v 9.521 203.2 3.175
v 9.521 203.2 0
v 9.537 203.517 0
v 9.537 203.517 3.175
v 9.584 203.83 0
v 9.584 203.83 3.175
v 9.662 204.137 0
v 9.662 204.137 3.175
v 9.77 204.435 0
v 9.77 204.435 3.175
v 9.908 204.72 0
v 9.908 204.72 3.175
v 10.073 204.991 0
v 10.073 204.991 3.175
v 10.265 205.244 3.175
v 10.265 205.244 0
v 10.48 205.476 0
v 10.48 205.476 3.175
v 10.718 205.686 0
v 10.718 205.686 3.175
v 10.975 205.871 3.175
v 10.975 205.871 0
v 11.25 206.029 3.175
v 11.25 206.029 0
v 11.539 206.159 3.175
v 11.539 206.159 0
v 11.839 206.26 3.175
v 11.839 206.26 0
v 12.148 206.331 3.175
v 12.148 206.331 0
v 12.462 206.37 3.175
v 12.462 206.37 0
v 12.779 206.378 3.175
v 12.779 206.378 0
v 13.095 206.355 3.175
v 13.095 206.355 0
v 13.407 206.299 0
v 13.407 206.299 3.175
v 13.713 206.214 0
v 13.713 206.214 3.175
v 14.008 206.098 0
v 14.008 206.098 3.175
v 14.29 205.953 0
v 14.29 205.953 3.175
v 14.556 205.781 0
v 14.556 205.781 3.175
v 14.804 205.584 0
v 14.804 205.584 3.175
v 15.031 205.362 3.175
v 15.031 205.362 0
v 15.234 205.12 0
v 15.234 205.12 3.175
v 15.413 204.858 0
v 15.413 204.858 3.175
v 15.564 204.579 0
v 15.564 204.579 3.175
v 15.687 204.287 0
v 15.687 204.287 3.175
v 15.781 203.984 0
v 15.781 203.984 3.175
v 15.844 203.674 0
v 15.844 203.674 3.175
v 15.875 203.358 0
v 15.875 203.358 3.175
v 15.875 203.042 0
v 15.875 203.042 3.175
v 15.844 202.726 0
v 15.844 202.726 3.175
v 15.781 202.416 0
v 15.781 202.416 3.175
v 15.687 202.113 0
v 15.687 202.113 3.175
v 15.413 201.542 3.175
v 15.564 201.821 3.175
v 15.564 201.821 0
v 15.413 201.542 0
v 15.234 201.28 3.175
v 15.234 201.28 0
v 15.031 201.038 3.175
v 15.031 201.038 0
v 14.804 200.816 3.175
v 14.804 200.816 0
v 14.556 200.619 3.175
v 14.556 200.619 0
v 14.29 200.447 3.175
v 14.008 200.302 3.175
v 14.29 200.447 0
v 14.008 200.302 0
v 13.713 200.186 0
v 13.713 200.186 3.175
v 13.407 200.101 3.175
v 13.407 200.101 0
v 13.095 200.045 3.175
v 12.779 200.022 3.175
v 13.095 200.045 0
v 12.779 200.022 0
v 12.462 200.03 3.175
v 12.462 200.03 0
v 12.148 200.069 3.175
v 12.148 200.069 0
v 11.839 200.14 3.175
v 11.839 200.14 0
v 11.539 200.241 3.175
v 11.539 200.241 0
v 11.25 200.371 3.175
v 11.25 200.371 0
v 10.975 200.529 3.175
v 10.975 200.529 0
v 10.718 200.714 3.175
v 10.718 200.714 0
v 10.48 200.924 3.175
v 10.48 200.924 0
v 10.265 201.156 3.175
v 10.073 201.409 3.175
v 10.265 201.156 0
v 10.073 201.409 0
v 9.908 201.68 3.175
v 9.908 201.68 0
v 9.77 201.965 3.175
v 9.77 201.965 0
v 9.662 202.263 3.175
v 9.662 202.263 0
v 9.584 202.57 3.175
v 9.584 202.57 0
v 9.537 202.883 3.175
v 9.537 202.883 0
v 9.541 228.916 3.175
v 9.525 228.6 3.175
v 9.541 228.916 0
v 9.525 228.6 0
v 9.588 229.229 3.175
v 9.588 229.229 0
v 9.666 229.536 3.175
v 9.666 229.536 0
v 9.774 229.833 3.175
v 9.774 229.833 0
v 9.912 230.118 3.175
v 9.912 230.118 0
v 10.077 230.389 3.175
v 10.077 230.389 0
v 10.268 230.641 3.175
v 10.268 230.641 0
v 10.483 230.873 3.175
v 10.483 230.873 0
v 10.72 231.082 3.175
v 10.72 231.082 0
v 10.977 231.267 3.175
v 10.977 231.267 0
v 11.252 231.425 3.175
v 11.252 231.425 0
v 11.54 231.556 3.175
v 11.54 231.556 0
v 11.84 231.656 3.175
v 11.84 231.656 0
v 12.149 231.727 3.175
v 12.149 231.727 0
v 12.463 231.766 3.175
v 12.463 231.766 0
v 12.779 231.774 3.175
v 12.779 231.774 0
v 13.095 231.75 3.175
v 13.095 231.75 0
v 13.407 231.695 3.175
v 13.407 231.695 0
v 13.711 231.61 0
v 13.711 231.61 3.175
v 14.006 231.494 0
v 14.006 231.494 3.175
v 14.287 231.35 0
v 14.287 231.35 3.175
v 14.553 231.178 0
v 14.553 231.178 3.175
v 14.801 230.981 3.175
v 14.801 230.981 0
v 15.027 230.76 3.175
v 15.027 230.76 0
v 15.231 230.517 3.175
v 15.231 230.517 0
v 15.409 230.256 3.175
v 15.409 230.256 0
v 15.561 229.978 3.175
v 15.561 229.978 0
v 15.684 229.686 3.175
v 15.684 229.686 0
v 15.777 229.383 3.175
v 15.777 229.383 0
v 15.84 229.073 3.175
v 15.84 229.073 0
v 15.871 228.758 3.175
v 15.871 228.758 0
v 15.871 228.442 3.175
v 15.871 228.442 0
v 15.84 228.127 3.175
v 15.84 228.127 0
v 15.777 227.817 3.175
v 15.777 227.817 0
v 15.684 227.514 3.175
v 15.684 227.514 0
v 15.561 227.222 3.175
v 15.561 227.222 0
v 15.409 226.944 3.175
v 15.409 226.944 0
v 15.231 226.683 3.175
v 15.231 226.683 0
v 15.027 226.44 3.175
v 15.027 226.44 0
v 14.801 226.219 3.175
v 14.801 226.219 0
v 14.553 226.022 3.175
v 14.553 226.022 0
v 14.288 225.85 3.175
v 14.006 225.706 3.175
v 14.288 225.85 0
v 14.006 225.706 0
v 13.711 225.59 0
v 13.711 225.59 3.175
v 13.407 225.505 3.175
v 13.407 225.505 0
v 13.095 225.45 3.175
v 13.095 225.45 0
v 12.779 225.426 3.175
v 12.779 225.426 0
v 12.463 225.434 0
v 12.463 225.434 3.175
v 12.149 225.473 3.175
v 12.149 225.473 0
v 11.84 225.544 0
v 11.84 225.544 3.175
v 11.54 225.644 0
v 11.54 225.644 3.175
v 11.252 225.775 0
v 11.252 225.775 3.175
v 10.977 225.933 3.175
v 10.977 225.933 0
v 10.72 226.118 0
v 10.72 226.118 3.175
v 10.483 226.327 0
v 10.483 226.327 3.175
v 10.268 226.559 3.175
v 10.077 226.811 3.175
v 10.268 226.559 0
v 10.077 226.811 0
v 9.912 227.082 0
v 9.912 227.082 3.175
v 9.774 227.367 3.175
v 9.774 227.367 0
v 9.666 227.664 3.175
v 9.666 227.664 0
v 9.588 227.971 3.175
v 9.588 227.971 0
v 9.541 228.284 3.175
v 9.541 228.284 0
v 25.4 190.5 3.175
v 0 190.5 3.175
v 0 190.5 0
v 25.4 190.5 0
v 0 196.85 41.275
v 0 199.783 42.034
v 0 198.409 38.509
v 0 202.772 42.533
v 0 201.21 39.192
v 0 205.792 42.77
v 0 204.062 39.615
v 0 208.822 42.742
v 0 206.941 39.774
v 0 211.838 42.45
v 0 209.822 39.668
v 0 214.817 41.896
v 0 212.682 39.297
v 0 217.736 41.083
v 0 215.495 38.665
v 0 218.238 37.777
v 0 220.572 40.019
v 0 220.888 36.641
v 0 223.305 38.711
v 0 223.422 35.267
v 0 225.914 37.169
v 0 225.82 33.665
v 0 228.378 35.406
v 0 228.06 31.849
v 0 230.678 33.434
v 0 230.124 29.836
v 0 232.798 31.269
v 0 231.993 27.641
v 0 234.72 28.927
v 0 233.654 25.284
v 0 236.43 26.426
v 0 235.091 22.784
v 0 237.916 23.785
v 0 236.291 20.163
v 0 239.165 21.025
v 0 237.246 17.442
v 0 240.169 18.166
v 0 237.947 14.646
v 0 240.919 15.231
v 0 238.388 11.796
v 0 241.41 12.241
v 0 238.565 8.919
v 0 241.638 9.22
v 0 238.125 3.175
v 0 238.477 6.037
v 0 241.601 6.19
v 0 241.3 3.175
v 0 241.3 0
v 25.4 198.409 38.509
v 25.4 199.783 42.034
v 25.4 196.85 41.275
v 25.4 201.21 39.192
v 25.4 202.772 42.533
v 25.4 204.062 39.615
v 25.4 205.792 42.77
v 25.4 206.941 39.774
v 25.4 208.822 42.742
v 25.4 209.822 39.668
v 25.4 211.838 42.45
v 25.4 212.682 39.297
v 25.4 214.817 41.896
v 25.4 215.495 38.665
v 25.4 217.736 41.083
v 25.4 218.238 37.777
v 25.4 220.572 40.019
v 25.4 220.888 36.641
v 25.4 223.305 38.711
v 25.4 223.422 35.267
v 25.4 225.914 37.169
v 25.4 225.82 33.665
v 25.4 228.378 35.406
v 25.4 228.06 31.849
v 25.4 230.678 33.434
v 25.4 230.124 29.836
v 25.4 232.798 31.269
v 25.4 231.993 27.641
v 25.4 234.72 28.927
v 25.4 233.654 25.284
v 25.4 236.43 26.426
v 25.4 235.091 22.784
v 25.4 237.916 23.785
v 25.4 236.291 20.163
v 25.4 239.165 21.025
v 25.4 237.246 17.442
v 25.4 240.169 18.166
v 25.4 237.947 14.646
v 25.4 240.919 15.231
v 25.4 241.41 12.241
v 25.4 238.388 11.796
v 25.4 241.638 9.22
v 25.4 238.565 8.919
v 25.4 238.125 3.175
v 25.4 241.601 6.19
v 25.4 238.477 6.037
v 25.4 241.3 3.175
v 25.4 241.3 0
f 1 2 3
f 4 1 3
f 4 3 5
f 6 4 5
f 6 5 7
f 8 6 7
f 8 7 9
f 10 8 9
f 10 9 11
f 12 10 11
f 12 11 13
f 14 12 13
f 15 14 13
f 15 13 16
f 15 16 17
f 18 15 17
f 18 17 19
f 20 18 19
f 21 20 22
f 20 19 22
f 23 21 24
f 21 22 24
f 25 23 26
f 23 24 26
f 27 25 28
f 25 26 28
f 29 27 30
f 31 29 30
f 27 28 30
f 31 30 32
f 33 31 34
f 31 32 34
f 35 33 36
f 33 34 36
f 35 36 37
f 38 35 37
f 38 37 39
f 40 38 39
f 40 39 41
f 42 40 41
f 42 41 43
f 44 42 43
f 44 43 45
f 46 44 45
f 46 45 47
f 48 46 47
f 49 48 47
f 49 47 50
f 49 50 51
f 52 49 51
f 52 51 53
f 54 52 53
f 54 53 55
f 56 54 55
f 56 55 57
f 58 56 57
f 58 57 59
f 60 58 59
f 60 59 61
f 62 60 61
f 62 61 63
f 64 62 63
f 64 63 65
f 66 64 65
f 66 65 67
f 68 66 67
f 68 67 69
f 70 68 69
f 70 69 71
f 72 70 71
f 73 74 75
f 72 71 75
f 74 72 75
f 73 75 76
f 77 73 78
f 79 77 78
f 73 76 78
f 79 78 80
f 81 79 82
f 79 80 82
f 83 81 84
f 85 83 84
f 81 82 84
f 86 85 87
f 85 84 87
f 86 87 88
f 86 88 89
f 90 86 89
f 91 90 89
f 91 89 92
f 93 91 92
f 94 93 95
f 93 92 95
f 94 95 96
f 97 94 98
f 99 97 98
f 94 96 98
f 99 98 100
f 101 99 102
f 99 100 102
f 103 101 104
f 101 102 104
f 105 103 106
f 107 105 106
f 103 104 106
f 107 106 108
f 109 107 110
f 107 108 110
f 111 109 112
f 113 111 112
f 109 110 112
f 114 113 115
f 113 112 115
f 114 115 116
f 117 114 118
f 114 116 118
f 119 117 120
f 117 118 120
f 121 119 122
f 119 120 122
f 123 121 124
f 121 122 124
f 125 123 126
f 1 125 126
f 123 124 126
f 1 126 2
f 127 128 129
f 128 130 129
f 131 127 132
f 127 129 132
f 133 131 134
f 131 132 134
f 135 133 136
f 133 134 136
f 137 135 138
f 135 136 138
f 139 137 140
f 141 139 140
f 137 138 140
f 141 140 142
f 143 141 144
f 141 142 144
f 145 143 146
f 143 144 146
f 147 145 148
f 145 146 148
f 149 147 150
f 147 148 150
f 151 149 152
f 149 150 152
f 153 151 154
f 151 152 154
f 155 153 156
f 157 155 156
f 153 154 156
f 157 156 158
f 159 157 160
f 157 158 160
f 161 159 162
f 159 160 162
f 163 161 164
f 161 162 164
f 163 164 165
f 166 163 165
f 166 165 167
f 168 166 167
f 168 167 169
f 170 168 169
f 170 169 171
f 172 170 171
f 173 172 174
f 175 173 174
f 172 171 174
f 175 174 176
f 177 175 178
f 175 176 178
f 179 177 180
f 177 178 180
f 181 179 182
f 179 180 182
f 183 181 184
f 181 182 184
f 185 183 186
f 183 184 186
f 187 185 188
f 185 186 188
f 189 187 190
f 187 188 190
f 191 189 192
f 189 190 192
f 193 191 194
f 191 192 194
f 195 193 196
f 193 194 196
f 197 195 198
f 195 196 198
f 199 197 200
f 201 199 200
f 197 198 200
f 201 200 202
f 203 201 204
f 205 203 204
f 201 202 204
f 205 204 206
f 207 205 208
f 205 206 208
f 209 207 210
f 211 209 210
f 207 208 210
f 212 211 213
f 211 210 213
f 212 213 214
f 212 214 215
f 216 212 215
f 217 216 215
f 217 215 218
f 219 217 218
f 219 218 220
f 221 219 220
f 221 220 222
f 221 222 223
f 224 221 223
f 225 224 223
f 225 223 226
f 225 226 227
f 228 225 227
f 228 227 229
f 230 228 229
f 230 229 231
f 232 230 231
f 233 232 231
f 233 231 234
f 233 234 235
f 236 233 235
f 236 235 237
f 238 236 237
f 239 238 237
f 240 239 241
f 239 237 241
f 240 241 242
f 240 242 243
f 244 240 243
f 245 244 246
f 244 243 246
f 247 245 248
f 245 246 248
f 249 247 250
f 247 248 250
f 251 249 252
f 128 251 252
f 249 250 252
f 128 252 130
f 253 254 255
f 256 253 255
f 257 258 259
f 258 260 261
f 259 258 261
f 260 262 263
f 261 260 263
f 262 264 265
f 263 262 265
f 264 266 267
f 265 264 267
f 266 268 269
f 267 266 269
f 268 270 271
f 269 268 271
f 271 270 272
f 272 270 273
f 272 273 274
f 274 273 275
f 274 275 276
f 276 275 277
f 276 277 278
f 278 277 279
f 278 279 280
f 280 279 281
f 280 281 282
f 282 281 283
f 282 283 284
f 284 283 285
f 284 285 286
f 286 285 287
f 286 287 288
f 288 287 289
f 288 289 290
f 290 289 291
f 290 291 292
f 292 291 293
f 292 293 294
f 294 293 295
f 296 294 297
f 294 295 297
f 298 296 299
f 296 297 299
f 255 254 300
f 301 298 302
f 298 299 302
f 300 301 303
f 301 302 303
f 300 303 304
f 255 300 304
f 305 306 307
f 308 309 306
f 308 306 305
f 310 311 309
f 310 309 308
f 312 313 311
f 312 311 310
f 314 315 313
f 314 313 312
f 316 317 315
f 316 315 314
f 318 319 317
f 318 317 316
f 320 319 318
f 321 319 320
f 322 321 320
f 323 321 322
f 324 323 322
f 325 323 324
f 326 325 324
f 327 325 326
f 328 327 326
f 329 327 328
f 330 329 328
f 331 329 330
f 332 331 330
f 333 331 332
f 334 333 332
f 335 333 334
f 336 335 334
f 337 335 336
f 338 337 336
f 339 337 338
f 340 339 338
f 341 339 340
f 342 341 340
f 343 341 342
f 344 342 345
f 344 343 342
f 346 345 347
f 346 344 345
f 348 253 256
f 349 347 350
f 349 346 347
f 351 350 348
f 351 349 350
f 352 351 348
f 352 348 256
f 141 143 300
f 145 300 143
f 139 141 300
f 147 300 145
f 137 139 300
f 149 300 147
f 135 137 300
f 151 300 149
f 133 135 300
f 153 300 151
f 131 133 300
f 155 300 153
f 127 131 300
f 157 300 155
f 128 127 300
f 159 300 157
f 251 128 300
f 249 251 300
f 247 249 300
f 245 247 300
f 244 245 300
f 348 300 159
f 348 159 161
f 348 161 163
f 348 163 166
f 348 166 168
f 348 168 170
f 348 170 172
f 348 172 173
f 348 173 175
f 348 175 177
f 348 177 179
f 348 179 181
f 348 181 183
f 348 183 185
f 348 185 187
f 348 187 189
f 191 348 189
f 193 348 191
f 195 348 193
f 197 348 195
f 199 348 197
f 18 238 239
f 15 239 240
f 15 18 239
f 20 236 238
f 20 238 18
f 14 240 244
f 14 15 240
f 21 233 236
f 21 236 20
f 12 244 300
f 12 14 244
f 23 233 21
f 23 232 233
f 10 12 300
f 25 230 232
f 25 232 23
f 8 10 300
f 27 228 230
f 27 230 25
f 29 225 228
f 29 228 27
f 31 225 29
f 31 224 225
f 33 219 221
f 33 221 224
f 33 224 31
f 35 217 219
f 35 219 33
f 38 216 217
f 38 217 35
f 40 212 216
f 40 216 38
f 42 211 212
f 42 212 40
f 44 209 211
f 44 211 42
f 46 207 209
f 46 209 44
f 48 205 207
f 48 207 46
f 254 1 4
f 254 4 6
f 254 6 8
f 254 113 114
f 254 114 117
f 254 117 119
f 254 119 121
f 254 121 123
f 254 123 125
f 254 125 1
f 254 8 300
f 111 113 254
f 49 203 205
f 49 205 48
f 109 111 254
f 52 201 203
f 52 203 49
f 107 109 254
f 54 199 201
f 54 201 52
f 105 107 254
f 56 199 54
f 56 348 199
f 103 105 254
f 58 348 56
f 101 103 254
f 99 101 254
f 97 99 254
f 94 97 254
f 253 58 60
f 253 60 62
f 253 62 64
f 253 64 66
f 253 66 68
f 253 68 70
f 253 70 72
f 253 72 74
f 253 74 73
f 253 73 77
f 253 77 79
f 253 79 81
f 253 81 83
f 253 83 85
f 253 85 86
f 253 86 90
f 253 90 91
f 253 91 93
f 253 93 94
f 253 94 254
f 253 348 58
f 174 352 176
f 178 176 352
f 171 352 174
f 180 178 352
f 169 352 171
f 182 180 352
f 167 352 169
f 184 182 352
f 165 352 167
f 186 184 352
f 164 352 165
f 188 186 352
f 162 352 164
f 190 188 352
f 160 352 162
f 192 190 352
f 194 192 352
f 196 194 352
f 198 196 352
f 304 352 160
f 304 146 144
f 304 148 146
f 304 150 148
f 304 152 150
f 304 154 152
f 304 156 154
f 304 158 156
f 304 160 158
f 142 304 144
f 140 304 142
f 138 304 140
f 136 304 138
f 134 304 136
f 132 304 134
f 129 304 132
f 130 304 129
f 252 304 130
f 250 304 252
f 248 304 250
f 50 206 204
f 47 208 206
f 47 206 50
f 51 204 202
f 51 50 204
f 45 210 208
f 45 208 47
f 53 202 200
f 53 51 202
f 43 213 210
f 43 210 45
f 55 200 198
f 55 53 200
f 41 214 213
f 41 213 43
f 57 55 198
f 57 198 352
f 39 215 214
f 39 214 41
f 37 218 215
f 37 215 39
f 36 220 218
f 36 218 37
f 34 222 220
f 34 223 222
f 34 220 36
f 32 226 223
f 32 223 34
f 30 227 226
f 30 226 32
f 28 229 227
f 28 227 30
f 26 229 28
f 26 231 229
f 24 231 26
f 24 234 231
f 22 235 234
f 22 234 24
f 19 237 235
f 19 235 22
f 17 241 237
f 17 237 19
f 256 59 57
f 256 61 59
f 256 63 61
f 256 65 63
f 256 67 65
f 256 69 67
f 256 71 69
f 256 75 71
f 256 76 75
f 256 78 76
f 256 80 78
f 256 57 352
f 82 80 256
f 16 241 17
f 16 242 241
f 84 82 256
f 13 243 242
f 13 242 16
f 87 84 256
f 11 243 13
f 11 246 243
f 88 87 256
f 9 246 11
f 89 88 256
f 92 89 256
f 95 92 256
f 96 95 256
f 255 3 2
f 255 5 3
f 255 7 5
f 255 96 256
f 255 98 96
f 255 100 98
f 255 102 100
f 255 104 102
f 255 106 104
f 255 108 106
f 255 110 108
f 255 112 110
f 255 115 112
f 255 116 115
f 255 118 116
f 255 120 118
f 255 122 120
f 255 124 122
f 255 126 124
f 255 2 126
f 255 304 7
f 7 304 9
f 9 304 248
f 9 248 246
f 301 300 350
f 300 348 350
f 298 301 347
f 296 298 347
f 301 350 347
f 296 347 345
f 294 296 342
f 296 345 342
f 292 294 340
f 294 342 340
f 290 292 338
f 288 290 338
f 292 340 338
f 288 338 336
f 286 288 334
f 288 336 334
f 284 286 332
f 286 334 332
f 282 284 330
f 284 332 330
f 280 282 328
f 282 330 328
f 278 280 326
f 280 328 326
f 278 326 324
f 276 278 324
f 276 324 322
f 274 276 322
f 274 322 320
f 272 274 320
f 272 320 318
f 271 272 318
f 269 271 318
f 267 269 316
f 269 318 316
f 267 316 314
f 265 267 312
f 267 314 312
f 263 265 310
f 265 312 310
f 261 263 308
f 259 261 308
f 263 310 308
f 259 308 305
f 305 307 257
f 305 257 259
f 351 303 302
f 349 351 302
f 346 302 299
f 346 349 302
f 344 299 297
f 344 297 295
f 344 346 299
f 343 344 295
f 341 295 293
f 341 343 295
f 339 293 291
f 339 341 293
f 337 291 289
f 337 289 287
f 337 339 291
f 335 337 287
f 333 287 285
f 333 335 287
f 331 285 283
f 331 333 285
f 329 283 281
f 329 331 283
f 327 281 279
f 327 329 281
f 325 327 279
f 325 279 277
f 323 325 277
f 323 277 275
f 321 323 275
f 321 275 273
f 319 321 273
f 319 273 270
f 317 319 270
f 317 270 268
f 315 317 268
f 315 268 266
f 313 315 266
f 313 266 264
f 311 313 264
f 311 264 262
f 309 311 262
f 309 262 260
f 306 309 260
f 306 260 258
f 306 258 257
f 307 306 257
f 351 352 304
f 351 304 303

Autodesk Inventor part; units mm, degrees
ref_plane "YZ Plane" through (0, 0, 0) normal (1, 0, 0) x (0, 1, 0)
ref_plane "XZ Plane" through (0, 0, 0) normal (0, 1, 0) x (-1, 0, 0)
ref_plane "XY Plane" through (0, 0, 0) normal (0, 0, 1) x (1, 0, 0)
sketch "Sketch1" plane through (0, 0, 0) normal (1, 0, 0) x (0, 1, 0)
  line L0 (0, 0) -> (241.3, 0)
  line L1 (241.3, 0) -> (241.3, -25.4)
  line L2 (241.3, -25.4) -> (0, -25.4)
  line L3 (0, -25.4) -> (0, 0)
  line L4 (6.3489, -9.0357) -> (12.6978, -5.3677)
  line L5 (12.6978, -5.3677) -> (19.0489, -9.0319)
  line L6 (19.0489, -9.0319) -> (19.0511, -16.3643)
  line L7 (19.0511, -16.3643) -> (12.7022, -20.0323)
  line L8 (12.7022, -20.0323) -> (6.3511, -16.3681)
  line L9 (6.3511, -16.3681) -> (6.3489, -9.0357)
  point P0 (12.7, -12.7)
  dimension "d0" = 241.3
  dimension "d1" = 25.4
  dimension "d3" = 12.7
  dimension "d4" = 12.7
extrude "Extrusion1" add sketch "Sketch1" along normal blind 25.4
sketch "Sketch2" plane through (0, 241.3, 0) normal (0, 1, 0) x (1, 0, 0)
  line L0 (0, 25.4) -> (25.4, 25.4) projected
  line L1 (0, 0) -> (25.4, 0)
  line L2 (25.4, 0) -> (25.4, 25.4)
  line L3 (25.4, 25.4) -> (0, 25.4)
  line L4 (0, 25.4) -> (0, 0)
  line L5 (22.225, 3.175) -> (3.175, 3.175)
  line L6 (3.175, 3.175) -> (3.175, 22.225)
  line L7 (3.175, 22.225) -> (22.225, 22.225)
  line L8 (22.225, 22.225) -> (22.225, 3.175)
  dimension "d7" = 3.175
extrude "Extrusion2" cut sketch "Sketch2" against normal blind 228.6 contours L5 L6 L7 L8
sketch "Sketch3" plane through (25.4, 0, 0) normal (1, 0, 0) x (0, 0, -1)
  line L0 (0, 241.3) -> (0, 190.5)
  line L1 (0, 0) -> (0, 241.3) projected
  line L2 (0, 241.3) -> (-3.175, 241.3)
  line L3 (-3.175, 241.3) -> (-3.175, 190.5)
  line L4 (-3.175, 190.5) -> (0, 190.5)
  line L5 (0, 190.5) -> (0, 241.3)
  arc A0 (-3.175, 241.3) -> (-46.143, 196.9282) centre (-8.4506, 203.4185) ccw
  line L6 (-3.175, 241.3) -> (-3.175, 238.125)
  arc A1 (-3.175, 238.125) -> (-42.9327, 197.9157) centre (-7.6224, 202.7623) ccw
  line L7 (-42.9327, 197.9157) -> (-46.143, 196.9282)
  dimension "d11" = 50.8
  dimension "d13" = 3.175
  dimension "d15" = 3.175
extrude "Extrusion3" add sketch "Sketch3" against normal blind 25.4 contours L0 L4 L3 L2
sketch "Sketch4" plane through (25.4, 0, 0) normal (1, 0, 0) x (0, 0, -1)
  point P0 (0, 0)
sketch "Sketch5" plane through (25.4, 0, 0) normal (1, 0, 0) x (0, 0, -1)
  line L0 (-3.175, 241.3) -> (-3.175, 190.5) projected
  line L1 (-3.175, 241.3) -> (-3.175, 196.85)
  line L2 (-3.175, 196.85) -> (-41.275, 196.85)
  arc A0 (-3.175, 241.3) -> (-41.275, 196.85) centre (-8.1247, 206.989) ccw
  line L3 (-41.275, 196.85) -> (-38.5091, 198.4089)
  line L4 (-3.175, 241.3) -> (-3.175, 238.125)
  arc A1 (-3.175, 238.125) -> (-38.5091, 198.4089) centre (-8.433, 207.227) ccw
  point P0 (0, 0)
  dimension "d18" = 44.45
  dimension "d19" = 38.1
  dimension "d20" = 3.175
  dimension "d21" = 3.175
extrude "Extrusion4" add sketch "Sketch5" against normal blind 25.4 contours L0 A1 L3 A0
sketch "Sketch6" plane through (25.4, 0, 0) normal (1, 0, 0) x (0, 0, -1)
  line L0 (0, 0) -> (25.4, 0) projected
  line L1 (25.4, 0) -> (25.4, 241.3) projected
  line L2 (12.7618, 20.0321) -> (19.0807, 16.3125)
  line L3 (19.0807, 16.3125) -> (19.0189, 8.9804)
  line L4 (19.0189, 8.9804) -> (12.6382, 5.3679)
  line L5 (12.6382, 5.3679) -> (6.3193, 9.0875)
  line L6 (6.3193, 9.0875) -> (6.3811, 16.4196)
  line L7 (6.3811, 16.4196) -> (12.7618, 20.0321)
  point P0 (12.7, 12.7)
  point P1 (12.7, 12.7)
  dimension "d25" = 12.7
  dimension "d26" = 12.7
  dimension "d27" = 12.7
extrude "Extrusion5" cut sketch "Sketch6" against normal blind 25.4
sketch "Sketch7" plane through (0, 0, 0) normal (-1, 0, 0) x (0, 0, 1)
  line L0 (-25.4, 241.3) -> (0, 241.3)
  line L1 (0, 241.3) -> (0, 0)
  line L2 (0, 0) -> (-25.4, 0)
  line L3 (-25.4, 0) -> (-25.4, 241.3)
extrude "Extrusion6" cut sketch "Sketch7" against normal blind 25.4
sketch "Sketch8" plane through (0, 190.5, 0) normal (0, 0, -1) x (-1, 0, 0)
  circle A0 centre (-12.7, 38.1) radius 3.175
  circle A1 centre (-12.7, 12.7) radius 3.1792
  line L0 (-25.4, 50.8) -> (0, 50.8) projected
  line L1 (-25.4, 0) -> (0, 0) projected
  point P0 (0, -190.5)
  dimension "d32" = 6.35
  dimension "d33" = 12.7
  dimension "d34" = 12.7
  dimension "d35" = 38.1
extrude "Extrusion7" cut sketch "Sketch8" against normal blind 3.175
properties part number "hand"
